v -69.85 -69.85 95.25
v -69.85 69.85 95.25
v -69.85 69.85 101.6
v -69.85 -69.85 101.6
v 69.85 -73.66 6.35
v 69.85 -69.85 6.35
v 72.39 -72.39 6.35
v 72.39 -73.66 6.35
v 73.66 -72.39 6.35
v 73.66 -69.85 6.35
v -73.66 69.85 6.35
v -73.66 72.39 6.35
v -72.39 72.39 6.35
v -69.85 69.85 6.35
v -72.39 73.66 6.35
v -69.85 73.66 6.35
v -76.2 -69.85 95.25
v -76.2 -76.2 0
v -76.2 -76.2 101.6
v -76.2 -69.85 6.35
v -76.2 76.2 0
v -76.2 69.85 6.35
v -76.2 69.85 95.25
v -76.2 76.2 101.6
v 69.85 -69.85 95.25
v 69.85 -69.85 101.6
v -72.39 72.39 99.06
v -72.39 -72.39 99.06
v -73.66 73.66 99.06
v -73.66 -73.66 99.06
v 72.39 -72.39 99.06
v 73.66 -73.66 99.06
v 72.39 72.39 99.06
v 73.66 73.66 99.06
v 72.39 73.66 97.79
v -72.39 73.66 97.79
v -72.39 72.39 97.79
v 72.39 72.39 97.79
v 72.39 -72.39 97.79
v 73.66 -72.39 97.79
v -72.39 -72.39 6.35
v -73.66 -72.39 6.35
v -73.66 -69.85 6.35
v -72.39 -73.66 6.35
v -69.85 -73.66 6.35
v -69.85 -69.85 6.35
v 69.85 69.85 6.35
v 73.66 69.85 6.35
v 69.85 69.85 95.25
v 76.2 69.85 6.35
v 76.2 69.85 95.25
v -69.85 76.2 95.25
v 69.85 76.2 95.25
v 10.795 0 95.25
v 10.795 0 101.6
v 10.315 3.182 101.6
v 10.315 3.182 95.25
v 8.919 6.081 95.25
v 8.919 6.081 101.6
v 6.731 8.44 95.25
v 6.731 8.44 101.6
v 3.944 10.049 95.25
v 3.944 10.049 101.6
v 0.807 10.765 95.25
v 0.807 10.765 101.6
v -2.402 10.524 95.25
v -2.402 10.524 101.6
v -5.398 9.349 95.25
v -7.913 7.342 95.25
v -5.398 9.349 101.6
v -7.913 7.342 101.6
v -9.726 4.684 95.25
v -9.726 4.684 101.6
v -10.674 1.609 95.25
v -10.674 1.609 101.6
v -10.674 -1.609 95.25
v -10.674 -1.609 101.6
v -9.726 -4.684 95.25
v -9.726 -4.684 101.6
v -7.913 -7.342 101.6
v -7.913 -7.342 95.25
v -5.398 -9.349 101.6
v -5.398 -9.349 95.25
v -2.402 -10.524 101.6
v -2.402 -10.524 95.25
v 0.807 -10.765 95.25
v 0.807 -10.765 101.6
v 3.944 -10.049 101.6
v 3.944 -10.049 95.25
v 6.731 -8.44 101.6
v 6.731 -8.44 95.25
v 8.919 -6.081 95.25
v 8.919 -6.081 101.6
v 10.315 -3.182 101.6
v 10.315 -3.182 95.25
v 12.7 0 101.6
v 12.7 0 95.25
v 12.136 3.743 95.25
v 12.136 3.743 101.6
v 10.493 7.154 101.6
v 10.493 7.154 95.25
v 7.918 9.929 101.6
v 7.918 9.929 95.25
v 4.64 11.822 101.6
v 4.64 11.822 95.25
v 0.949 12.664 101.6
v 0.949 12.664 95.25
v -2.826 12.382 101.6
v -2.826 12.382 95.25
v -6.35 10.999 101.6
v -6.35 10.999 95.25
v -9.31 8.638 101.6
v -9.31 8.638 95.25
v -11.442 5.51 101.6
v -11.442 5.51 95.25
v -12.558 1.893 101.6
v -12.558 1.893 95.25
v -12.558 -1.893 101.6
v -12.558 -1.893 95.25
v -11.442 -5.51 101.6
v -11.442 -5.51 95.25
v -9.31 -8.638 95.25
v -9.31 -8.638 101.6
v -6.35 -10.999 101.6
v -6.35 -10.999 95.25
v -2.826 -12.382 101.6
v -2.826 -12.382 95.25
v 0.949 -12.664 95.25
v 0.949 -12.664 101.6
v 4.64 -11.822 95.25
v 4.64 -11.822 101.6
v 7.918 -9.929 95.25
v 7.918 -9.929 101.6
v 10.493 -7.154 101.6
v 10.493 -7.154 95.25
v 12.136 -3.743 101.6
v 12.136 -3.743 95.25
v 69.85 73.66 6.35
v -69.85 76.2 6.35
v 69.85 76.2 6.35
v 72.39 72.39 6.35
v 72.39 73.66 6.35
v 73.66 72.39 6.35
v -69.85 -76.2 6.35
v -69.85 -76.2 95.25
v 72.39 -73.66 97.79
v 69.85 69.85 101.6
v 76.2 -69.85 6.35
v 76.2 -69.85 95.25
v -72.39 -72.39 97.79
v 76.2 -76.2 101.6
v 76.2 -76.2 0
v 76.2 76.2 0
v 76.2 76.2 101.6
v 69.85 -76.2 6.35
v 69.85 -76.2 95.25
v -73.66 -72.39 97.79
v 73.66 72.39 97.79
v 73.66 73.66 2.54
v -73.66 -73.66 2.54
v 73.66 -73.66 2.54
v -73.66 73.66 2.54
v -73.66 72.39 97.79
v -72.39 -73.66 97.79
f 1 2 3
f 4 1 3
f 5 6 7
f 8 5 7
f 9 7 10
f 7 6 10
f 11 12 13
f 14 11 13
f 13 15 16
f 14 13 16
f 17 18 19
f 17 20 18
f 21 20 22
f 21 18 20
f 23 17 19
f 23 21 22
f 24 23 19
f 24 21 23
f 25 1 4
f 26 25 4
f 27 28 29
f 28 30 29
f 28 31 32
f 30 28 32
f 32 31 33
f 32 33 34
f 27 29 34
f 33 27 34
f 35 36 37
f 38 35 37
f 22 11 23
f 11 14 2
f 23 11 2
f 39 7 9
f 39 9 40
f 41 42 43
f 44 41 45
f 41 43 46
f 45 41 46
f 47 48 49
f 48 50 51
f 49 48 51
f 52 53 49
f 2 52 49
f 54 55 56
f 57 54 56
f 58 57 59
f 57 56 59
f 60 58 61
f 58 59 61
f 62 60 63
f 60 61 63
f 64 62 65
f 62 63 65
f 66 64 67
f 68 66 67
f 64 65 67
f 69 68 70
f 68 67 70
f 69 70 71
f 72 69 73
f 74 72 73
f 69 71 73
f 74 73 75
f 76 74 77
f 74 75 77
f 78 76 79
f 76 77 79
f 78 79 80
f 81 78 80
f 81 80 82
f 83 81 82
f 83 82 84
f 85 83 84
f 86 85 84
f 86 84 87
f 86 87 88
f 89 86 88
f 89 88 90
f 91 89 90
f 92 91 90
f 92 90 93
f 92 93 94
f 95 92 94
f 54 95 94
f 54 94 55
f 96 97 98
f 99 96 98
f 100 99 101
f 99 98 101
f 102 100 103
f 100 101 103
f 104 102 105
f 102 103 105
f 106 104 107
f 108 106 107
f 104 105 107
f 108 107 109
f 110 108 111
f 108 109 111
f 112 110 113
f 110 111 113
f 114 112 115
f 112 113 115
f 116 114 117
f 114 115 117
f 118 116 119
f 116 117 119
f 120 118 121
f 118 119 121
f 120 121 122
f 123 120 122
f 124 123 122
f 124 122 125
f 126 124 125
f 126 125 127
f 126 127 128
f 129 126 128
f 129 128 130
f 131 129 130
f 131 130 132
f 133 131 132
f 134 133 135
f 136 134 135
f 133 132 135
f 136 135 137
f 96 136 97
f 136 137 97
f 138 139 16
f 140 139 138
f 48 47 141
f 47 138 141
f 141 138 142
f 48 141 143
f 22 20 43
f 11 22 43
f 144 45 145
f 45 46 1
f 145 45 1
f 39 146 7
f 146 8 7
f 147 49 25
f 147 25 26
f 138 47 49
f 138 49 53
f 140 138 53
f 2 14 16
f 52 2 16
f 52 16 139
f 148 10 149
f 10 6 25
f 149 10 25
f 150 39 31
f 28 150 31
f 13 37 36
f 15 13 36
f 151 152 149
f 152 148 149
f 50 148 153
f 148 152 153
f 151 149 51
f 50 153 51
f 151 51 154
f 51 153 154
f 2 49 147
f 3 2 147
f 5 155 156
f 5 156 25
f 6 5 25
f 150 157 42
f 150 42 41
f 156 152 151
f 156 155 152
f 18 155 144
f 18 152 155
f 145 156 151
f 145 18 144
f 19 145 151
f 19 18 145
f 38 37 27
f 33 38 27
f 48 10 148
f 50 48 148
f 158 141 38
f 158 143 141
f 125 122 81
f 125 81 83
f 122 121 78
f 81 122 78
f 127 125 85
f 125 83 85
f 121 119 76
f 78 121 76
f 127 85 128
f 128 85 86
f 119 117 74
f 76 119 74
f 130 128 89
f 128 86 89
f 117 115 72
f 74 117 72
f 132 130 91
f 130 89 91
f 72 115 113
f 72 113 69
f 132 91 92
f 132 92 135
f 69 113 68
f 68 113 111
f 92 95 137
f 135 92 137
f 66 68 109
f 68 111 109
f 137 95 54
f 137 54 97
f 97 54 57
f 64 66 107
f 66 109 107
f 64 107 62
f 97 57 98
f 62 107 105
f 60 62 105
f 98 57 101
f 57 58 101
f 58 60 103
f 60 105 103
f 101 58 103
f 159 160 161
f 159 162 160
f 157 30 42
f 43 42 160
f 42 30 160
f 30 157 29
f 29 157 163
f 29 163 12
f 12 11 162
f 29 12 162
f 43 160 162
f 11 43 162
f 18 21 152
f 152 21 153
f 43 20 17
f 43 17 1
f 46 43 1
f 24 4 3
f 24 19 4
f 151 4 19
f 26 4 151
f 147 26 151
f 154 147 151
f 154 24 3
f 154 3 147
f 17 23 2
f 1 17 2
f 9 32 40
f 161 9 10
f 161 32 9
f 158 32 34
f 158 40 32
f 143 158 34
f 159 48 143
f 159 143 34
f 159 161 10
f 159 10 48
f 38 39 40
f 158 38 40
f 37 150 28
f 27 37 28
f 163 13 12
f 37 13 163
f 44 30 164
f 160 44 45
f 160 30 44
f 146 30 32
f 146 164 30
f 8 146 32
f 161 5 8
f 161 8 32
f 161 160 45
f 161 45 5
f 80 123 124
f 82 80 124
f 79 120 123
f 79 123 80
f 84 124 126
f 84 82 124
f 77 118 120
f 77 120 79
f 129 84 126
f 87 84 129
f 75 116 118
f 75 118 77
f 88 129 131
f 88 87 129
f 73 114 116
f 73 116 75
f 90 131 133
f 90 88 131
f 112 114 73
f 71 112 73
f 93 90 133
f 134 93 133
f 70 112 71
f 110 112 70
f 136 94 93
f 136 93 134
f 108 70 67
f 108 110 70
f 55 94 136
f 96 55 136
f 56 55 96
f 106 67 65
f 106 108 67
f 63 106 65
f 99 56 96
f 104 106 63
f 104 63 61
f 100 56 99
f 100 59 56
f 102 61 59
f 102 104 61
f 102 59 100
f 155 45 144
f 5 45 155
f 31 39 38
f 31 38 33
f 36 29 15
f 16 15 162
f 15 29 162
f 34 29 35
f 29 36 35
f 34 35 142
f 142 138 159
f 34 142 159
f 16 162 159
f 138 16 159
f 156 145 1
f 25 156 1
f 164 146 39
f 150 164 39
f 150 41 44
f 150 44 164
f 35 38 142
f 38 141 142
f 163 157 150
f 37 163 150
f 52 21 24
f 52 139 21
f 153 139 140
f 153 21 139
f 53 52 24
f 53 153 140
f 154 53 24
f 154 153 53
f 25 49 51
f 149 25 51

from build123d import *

# Parameters (mm, degrees)
F0_W      = 152.4
F0_H      = 152.4
F1_DEPTH  = 6.35
F2_W      = 6.35
F2_H      = 6.35
F3_DEPTH  = 95.25
F4_W      = 6.35
F4_H      = 6.35
F5_DEPTH  = 95.25
F6_W      = 6.35
F6_H      = 6.35
F7_DEPTH  = 95.25
F8_W      = 6.35
F8_H      = 6.35
F9_DEPTH  = 95.25
F10_W     = 6.35
F10_H     = 6.35
F11_DEPTH = 139.7
F12_W     = 6.35
F12_H     = 6.35
F13_DEPTH = 139.7
F14_W     = 6.35
F14_H     = 6.35
F15_DEPTH = 139.7
F16_W     = 6.35
F16_H     = 6.35
F17_DEPTH = 139.7
F18_T     = -2.54
F22_R     = 12.7
F23_DEPTH = 6.35
F24_R     = 10.795
F25_DEPTH = 25.4


# Not quite as in the source:
# - a shell that OpenCascade refuses in one call is made with other operations: the cavity is built on its own and cut out
# - the program builds the solid bodies; features that only make, move or delete a surface that nothing else refers to are left out


with BuildPart() as f1:
    # F0 (on Top) → F1 (new body)
    with BuildSketch(Plane.XY):
        Rectangle(F0_W, F0_H)
    extrude(amount=F1_DEPTH)

    # F2 (on face) → F3 (join)
    with BuildSketch(Plane.XY.offset(6.35)):
        with Locations((73.025, -73.025)):
            Rectangle(F2_W, F2_H)
    extrude(amount=F3_DEPTH)

    # F4 (on face) → F5 (join)
    with BuildSketch(Plane.XY.offset(6.35)):
        with Locations((73.025, 73.025)):
            Rectangle(F4_W, F4_H)
    extrude(amount=F5_DEPTH)

    # F6 (on face) → F7 (join)
    with BuildSketch(Plane.XY.offset(6.35)):
        with Locations((-73.025, 73.025)):
            Rectangle(F6_W, F6_H)
    extrude(amount=F7_DEPTH)

    # F8 (on face) → F9 (join)
    with BuildSketch(Plane.XY.offset(6.35)):
        with Locations((-73.025, -73.025)):
            Rectangle(F8_W, F8_H)
    extrude(amount=F9_DEPTH)

    # F10 (on face) → F11 (join)
    with BuildSketch(Plane(origin=(69.85, 0, 0), x_dir=(0, -1, 0), z_dir=(-1, 0, 0))):
        with Locations((-73.025, 98.425)):
            Rectangle(F10_W, F10_H)
    extrude(amount=F11_DEPTH)

    # F12 (on face) → F13 (join)
    with BuildSketch(Plane.XZ.offset(-69.85)):
        with Locations((-73.025, 98.425)):
            Rectangle(F12_W, F12_H)
    extrude(amount=F13_DEPTH)

    # F14 (on face) → F15 (join)
    with BuildSketch(Plane.YZ.offset(-69.85)):
        with Locations((-73.025, 98.425)):
            Rectangle(F14_W, F14_H)
    extrude(amount=F15_DEPTH)

    # F16 (on face) → F17 (join)
    with BuildSketch(Plane.XZ.offset(-69.85)):
        with Locations((73.025, 98.425)):
            Rectangle(F16_W, F16_H)
    extrude(amount=F17_DEPTH)

    # F18: a shell. OpenCascade refuses it in one call, so the cavity is built on its own and cut out:
    # the body offset inwards by the wall thickness, plus a prism from it out through each open face.
    f18_core = offset(f1.part, amount=F18_T, kind=Kind.INTERSECTION, mode=Mode.PRIVATE)
    f18_exits = [f18_core.faces().sort_by_distance(p)[0] for p in [
        (0, 0, 3.81),
    ]]
    add(f18_core, mode=Mode.SUBTRACT)
    extrude(f18_exits, amount=-F18_T, mode=Mode.SUBTRACT)


with BuildPart() as f23:
    # F22 (on offset) → F23 (new body)
    with BuildSketch(Plane.XY.offset(95.25)):
        Circle(F22_R)
    extrude(amount=F23_DEPTH)

    # F24 (on face) → F25 (cut)
    with BuildSketch(Plane.XY.offset(101.6)):
        Circle(F24_R)
    extrude(amount=-F25_DEPTH, mode=Mode.SUBTRACT)


solid = Compound([f1.part, f23.part])
